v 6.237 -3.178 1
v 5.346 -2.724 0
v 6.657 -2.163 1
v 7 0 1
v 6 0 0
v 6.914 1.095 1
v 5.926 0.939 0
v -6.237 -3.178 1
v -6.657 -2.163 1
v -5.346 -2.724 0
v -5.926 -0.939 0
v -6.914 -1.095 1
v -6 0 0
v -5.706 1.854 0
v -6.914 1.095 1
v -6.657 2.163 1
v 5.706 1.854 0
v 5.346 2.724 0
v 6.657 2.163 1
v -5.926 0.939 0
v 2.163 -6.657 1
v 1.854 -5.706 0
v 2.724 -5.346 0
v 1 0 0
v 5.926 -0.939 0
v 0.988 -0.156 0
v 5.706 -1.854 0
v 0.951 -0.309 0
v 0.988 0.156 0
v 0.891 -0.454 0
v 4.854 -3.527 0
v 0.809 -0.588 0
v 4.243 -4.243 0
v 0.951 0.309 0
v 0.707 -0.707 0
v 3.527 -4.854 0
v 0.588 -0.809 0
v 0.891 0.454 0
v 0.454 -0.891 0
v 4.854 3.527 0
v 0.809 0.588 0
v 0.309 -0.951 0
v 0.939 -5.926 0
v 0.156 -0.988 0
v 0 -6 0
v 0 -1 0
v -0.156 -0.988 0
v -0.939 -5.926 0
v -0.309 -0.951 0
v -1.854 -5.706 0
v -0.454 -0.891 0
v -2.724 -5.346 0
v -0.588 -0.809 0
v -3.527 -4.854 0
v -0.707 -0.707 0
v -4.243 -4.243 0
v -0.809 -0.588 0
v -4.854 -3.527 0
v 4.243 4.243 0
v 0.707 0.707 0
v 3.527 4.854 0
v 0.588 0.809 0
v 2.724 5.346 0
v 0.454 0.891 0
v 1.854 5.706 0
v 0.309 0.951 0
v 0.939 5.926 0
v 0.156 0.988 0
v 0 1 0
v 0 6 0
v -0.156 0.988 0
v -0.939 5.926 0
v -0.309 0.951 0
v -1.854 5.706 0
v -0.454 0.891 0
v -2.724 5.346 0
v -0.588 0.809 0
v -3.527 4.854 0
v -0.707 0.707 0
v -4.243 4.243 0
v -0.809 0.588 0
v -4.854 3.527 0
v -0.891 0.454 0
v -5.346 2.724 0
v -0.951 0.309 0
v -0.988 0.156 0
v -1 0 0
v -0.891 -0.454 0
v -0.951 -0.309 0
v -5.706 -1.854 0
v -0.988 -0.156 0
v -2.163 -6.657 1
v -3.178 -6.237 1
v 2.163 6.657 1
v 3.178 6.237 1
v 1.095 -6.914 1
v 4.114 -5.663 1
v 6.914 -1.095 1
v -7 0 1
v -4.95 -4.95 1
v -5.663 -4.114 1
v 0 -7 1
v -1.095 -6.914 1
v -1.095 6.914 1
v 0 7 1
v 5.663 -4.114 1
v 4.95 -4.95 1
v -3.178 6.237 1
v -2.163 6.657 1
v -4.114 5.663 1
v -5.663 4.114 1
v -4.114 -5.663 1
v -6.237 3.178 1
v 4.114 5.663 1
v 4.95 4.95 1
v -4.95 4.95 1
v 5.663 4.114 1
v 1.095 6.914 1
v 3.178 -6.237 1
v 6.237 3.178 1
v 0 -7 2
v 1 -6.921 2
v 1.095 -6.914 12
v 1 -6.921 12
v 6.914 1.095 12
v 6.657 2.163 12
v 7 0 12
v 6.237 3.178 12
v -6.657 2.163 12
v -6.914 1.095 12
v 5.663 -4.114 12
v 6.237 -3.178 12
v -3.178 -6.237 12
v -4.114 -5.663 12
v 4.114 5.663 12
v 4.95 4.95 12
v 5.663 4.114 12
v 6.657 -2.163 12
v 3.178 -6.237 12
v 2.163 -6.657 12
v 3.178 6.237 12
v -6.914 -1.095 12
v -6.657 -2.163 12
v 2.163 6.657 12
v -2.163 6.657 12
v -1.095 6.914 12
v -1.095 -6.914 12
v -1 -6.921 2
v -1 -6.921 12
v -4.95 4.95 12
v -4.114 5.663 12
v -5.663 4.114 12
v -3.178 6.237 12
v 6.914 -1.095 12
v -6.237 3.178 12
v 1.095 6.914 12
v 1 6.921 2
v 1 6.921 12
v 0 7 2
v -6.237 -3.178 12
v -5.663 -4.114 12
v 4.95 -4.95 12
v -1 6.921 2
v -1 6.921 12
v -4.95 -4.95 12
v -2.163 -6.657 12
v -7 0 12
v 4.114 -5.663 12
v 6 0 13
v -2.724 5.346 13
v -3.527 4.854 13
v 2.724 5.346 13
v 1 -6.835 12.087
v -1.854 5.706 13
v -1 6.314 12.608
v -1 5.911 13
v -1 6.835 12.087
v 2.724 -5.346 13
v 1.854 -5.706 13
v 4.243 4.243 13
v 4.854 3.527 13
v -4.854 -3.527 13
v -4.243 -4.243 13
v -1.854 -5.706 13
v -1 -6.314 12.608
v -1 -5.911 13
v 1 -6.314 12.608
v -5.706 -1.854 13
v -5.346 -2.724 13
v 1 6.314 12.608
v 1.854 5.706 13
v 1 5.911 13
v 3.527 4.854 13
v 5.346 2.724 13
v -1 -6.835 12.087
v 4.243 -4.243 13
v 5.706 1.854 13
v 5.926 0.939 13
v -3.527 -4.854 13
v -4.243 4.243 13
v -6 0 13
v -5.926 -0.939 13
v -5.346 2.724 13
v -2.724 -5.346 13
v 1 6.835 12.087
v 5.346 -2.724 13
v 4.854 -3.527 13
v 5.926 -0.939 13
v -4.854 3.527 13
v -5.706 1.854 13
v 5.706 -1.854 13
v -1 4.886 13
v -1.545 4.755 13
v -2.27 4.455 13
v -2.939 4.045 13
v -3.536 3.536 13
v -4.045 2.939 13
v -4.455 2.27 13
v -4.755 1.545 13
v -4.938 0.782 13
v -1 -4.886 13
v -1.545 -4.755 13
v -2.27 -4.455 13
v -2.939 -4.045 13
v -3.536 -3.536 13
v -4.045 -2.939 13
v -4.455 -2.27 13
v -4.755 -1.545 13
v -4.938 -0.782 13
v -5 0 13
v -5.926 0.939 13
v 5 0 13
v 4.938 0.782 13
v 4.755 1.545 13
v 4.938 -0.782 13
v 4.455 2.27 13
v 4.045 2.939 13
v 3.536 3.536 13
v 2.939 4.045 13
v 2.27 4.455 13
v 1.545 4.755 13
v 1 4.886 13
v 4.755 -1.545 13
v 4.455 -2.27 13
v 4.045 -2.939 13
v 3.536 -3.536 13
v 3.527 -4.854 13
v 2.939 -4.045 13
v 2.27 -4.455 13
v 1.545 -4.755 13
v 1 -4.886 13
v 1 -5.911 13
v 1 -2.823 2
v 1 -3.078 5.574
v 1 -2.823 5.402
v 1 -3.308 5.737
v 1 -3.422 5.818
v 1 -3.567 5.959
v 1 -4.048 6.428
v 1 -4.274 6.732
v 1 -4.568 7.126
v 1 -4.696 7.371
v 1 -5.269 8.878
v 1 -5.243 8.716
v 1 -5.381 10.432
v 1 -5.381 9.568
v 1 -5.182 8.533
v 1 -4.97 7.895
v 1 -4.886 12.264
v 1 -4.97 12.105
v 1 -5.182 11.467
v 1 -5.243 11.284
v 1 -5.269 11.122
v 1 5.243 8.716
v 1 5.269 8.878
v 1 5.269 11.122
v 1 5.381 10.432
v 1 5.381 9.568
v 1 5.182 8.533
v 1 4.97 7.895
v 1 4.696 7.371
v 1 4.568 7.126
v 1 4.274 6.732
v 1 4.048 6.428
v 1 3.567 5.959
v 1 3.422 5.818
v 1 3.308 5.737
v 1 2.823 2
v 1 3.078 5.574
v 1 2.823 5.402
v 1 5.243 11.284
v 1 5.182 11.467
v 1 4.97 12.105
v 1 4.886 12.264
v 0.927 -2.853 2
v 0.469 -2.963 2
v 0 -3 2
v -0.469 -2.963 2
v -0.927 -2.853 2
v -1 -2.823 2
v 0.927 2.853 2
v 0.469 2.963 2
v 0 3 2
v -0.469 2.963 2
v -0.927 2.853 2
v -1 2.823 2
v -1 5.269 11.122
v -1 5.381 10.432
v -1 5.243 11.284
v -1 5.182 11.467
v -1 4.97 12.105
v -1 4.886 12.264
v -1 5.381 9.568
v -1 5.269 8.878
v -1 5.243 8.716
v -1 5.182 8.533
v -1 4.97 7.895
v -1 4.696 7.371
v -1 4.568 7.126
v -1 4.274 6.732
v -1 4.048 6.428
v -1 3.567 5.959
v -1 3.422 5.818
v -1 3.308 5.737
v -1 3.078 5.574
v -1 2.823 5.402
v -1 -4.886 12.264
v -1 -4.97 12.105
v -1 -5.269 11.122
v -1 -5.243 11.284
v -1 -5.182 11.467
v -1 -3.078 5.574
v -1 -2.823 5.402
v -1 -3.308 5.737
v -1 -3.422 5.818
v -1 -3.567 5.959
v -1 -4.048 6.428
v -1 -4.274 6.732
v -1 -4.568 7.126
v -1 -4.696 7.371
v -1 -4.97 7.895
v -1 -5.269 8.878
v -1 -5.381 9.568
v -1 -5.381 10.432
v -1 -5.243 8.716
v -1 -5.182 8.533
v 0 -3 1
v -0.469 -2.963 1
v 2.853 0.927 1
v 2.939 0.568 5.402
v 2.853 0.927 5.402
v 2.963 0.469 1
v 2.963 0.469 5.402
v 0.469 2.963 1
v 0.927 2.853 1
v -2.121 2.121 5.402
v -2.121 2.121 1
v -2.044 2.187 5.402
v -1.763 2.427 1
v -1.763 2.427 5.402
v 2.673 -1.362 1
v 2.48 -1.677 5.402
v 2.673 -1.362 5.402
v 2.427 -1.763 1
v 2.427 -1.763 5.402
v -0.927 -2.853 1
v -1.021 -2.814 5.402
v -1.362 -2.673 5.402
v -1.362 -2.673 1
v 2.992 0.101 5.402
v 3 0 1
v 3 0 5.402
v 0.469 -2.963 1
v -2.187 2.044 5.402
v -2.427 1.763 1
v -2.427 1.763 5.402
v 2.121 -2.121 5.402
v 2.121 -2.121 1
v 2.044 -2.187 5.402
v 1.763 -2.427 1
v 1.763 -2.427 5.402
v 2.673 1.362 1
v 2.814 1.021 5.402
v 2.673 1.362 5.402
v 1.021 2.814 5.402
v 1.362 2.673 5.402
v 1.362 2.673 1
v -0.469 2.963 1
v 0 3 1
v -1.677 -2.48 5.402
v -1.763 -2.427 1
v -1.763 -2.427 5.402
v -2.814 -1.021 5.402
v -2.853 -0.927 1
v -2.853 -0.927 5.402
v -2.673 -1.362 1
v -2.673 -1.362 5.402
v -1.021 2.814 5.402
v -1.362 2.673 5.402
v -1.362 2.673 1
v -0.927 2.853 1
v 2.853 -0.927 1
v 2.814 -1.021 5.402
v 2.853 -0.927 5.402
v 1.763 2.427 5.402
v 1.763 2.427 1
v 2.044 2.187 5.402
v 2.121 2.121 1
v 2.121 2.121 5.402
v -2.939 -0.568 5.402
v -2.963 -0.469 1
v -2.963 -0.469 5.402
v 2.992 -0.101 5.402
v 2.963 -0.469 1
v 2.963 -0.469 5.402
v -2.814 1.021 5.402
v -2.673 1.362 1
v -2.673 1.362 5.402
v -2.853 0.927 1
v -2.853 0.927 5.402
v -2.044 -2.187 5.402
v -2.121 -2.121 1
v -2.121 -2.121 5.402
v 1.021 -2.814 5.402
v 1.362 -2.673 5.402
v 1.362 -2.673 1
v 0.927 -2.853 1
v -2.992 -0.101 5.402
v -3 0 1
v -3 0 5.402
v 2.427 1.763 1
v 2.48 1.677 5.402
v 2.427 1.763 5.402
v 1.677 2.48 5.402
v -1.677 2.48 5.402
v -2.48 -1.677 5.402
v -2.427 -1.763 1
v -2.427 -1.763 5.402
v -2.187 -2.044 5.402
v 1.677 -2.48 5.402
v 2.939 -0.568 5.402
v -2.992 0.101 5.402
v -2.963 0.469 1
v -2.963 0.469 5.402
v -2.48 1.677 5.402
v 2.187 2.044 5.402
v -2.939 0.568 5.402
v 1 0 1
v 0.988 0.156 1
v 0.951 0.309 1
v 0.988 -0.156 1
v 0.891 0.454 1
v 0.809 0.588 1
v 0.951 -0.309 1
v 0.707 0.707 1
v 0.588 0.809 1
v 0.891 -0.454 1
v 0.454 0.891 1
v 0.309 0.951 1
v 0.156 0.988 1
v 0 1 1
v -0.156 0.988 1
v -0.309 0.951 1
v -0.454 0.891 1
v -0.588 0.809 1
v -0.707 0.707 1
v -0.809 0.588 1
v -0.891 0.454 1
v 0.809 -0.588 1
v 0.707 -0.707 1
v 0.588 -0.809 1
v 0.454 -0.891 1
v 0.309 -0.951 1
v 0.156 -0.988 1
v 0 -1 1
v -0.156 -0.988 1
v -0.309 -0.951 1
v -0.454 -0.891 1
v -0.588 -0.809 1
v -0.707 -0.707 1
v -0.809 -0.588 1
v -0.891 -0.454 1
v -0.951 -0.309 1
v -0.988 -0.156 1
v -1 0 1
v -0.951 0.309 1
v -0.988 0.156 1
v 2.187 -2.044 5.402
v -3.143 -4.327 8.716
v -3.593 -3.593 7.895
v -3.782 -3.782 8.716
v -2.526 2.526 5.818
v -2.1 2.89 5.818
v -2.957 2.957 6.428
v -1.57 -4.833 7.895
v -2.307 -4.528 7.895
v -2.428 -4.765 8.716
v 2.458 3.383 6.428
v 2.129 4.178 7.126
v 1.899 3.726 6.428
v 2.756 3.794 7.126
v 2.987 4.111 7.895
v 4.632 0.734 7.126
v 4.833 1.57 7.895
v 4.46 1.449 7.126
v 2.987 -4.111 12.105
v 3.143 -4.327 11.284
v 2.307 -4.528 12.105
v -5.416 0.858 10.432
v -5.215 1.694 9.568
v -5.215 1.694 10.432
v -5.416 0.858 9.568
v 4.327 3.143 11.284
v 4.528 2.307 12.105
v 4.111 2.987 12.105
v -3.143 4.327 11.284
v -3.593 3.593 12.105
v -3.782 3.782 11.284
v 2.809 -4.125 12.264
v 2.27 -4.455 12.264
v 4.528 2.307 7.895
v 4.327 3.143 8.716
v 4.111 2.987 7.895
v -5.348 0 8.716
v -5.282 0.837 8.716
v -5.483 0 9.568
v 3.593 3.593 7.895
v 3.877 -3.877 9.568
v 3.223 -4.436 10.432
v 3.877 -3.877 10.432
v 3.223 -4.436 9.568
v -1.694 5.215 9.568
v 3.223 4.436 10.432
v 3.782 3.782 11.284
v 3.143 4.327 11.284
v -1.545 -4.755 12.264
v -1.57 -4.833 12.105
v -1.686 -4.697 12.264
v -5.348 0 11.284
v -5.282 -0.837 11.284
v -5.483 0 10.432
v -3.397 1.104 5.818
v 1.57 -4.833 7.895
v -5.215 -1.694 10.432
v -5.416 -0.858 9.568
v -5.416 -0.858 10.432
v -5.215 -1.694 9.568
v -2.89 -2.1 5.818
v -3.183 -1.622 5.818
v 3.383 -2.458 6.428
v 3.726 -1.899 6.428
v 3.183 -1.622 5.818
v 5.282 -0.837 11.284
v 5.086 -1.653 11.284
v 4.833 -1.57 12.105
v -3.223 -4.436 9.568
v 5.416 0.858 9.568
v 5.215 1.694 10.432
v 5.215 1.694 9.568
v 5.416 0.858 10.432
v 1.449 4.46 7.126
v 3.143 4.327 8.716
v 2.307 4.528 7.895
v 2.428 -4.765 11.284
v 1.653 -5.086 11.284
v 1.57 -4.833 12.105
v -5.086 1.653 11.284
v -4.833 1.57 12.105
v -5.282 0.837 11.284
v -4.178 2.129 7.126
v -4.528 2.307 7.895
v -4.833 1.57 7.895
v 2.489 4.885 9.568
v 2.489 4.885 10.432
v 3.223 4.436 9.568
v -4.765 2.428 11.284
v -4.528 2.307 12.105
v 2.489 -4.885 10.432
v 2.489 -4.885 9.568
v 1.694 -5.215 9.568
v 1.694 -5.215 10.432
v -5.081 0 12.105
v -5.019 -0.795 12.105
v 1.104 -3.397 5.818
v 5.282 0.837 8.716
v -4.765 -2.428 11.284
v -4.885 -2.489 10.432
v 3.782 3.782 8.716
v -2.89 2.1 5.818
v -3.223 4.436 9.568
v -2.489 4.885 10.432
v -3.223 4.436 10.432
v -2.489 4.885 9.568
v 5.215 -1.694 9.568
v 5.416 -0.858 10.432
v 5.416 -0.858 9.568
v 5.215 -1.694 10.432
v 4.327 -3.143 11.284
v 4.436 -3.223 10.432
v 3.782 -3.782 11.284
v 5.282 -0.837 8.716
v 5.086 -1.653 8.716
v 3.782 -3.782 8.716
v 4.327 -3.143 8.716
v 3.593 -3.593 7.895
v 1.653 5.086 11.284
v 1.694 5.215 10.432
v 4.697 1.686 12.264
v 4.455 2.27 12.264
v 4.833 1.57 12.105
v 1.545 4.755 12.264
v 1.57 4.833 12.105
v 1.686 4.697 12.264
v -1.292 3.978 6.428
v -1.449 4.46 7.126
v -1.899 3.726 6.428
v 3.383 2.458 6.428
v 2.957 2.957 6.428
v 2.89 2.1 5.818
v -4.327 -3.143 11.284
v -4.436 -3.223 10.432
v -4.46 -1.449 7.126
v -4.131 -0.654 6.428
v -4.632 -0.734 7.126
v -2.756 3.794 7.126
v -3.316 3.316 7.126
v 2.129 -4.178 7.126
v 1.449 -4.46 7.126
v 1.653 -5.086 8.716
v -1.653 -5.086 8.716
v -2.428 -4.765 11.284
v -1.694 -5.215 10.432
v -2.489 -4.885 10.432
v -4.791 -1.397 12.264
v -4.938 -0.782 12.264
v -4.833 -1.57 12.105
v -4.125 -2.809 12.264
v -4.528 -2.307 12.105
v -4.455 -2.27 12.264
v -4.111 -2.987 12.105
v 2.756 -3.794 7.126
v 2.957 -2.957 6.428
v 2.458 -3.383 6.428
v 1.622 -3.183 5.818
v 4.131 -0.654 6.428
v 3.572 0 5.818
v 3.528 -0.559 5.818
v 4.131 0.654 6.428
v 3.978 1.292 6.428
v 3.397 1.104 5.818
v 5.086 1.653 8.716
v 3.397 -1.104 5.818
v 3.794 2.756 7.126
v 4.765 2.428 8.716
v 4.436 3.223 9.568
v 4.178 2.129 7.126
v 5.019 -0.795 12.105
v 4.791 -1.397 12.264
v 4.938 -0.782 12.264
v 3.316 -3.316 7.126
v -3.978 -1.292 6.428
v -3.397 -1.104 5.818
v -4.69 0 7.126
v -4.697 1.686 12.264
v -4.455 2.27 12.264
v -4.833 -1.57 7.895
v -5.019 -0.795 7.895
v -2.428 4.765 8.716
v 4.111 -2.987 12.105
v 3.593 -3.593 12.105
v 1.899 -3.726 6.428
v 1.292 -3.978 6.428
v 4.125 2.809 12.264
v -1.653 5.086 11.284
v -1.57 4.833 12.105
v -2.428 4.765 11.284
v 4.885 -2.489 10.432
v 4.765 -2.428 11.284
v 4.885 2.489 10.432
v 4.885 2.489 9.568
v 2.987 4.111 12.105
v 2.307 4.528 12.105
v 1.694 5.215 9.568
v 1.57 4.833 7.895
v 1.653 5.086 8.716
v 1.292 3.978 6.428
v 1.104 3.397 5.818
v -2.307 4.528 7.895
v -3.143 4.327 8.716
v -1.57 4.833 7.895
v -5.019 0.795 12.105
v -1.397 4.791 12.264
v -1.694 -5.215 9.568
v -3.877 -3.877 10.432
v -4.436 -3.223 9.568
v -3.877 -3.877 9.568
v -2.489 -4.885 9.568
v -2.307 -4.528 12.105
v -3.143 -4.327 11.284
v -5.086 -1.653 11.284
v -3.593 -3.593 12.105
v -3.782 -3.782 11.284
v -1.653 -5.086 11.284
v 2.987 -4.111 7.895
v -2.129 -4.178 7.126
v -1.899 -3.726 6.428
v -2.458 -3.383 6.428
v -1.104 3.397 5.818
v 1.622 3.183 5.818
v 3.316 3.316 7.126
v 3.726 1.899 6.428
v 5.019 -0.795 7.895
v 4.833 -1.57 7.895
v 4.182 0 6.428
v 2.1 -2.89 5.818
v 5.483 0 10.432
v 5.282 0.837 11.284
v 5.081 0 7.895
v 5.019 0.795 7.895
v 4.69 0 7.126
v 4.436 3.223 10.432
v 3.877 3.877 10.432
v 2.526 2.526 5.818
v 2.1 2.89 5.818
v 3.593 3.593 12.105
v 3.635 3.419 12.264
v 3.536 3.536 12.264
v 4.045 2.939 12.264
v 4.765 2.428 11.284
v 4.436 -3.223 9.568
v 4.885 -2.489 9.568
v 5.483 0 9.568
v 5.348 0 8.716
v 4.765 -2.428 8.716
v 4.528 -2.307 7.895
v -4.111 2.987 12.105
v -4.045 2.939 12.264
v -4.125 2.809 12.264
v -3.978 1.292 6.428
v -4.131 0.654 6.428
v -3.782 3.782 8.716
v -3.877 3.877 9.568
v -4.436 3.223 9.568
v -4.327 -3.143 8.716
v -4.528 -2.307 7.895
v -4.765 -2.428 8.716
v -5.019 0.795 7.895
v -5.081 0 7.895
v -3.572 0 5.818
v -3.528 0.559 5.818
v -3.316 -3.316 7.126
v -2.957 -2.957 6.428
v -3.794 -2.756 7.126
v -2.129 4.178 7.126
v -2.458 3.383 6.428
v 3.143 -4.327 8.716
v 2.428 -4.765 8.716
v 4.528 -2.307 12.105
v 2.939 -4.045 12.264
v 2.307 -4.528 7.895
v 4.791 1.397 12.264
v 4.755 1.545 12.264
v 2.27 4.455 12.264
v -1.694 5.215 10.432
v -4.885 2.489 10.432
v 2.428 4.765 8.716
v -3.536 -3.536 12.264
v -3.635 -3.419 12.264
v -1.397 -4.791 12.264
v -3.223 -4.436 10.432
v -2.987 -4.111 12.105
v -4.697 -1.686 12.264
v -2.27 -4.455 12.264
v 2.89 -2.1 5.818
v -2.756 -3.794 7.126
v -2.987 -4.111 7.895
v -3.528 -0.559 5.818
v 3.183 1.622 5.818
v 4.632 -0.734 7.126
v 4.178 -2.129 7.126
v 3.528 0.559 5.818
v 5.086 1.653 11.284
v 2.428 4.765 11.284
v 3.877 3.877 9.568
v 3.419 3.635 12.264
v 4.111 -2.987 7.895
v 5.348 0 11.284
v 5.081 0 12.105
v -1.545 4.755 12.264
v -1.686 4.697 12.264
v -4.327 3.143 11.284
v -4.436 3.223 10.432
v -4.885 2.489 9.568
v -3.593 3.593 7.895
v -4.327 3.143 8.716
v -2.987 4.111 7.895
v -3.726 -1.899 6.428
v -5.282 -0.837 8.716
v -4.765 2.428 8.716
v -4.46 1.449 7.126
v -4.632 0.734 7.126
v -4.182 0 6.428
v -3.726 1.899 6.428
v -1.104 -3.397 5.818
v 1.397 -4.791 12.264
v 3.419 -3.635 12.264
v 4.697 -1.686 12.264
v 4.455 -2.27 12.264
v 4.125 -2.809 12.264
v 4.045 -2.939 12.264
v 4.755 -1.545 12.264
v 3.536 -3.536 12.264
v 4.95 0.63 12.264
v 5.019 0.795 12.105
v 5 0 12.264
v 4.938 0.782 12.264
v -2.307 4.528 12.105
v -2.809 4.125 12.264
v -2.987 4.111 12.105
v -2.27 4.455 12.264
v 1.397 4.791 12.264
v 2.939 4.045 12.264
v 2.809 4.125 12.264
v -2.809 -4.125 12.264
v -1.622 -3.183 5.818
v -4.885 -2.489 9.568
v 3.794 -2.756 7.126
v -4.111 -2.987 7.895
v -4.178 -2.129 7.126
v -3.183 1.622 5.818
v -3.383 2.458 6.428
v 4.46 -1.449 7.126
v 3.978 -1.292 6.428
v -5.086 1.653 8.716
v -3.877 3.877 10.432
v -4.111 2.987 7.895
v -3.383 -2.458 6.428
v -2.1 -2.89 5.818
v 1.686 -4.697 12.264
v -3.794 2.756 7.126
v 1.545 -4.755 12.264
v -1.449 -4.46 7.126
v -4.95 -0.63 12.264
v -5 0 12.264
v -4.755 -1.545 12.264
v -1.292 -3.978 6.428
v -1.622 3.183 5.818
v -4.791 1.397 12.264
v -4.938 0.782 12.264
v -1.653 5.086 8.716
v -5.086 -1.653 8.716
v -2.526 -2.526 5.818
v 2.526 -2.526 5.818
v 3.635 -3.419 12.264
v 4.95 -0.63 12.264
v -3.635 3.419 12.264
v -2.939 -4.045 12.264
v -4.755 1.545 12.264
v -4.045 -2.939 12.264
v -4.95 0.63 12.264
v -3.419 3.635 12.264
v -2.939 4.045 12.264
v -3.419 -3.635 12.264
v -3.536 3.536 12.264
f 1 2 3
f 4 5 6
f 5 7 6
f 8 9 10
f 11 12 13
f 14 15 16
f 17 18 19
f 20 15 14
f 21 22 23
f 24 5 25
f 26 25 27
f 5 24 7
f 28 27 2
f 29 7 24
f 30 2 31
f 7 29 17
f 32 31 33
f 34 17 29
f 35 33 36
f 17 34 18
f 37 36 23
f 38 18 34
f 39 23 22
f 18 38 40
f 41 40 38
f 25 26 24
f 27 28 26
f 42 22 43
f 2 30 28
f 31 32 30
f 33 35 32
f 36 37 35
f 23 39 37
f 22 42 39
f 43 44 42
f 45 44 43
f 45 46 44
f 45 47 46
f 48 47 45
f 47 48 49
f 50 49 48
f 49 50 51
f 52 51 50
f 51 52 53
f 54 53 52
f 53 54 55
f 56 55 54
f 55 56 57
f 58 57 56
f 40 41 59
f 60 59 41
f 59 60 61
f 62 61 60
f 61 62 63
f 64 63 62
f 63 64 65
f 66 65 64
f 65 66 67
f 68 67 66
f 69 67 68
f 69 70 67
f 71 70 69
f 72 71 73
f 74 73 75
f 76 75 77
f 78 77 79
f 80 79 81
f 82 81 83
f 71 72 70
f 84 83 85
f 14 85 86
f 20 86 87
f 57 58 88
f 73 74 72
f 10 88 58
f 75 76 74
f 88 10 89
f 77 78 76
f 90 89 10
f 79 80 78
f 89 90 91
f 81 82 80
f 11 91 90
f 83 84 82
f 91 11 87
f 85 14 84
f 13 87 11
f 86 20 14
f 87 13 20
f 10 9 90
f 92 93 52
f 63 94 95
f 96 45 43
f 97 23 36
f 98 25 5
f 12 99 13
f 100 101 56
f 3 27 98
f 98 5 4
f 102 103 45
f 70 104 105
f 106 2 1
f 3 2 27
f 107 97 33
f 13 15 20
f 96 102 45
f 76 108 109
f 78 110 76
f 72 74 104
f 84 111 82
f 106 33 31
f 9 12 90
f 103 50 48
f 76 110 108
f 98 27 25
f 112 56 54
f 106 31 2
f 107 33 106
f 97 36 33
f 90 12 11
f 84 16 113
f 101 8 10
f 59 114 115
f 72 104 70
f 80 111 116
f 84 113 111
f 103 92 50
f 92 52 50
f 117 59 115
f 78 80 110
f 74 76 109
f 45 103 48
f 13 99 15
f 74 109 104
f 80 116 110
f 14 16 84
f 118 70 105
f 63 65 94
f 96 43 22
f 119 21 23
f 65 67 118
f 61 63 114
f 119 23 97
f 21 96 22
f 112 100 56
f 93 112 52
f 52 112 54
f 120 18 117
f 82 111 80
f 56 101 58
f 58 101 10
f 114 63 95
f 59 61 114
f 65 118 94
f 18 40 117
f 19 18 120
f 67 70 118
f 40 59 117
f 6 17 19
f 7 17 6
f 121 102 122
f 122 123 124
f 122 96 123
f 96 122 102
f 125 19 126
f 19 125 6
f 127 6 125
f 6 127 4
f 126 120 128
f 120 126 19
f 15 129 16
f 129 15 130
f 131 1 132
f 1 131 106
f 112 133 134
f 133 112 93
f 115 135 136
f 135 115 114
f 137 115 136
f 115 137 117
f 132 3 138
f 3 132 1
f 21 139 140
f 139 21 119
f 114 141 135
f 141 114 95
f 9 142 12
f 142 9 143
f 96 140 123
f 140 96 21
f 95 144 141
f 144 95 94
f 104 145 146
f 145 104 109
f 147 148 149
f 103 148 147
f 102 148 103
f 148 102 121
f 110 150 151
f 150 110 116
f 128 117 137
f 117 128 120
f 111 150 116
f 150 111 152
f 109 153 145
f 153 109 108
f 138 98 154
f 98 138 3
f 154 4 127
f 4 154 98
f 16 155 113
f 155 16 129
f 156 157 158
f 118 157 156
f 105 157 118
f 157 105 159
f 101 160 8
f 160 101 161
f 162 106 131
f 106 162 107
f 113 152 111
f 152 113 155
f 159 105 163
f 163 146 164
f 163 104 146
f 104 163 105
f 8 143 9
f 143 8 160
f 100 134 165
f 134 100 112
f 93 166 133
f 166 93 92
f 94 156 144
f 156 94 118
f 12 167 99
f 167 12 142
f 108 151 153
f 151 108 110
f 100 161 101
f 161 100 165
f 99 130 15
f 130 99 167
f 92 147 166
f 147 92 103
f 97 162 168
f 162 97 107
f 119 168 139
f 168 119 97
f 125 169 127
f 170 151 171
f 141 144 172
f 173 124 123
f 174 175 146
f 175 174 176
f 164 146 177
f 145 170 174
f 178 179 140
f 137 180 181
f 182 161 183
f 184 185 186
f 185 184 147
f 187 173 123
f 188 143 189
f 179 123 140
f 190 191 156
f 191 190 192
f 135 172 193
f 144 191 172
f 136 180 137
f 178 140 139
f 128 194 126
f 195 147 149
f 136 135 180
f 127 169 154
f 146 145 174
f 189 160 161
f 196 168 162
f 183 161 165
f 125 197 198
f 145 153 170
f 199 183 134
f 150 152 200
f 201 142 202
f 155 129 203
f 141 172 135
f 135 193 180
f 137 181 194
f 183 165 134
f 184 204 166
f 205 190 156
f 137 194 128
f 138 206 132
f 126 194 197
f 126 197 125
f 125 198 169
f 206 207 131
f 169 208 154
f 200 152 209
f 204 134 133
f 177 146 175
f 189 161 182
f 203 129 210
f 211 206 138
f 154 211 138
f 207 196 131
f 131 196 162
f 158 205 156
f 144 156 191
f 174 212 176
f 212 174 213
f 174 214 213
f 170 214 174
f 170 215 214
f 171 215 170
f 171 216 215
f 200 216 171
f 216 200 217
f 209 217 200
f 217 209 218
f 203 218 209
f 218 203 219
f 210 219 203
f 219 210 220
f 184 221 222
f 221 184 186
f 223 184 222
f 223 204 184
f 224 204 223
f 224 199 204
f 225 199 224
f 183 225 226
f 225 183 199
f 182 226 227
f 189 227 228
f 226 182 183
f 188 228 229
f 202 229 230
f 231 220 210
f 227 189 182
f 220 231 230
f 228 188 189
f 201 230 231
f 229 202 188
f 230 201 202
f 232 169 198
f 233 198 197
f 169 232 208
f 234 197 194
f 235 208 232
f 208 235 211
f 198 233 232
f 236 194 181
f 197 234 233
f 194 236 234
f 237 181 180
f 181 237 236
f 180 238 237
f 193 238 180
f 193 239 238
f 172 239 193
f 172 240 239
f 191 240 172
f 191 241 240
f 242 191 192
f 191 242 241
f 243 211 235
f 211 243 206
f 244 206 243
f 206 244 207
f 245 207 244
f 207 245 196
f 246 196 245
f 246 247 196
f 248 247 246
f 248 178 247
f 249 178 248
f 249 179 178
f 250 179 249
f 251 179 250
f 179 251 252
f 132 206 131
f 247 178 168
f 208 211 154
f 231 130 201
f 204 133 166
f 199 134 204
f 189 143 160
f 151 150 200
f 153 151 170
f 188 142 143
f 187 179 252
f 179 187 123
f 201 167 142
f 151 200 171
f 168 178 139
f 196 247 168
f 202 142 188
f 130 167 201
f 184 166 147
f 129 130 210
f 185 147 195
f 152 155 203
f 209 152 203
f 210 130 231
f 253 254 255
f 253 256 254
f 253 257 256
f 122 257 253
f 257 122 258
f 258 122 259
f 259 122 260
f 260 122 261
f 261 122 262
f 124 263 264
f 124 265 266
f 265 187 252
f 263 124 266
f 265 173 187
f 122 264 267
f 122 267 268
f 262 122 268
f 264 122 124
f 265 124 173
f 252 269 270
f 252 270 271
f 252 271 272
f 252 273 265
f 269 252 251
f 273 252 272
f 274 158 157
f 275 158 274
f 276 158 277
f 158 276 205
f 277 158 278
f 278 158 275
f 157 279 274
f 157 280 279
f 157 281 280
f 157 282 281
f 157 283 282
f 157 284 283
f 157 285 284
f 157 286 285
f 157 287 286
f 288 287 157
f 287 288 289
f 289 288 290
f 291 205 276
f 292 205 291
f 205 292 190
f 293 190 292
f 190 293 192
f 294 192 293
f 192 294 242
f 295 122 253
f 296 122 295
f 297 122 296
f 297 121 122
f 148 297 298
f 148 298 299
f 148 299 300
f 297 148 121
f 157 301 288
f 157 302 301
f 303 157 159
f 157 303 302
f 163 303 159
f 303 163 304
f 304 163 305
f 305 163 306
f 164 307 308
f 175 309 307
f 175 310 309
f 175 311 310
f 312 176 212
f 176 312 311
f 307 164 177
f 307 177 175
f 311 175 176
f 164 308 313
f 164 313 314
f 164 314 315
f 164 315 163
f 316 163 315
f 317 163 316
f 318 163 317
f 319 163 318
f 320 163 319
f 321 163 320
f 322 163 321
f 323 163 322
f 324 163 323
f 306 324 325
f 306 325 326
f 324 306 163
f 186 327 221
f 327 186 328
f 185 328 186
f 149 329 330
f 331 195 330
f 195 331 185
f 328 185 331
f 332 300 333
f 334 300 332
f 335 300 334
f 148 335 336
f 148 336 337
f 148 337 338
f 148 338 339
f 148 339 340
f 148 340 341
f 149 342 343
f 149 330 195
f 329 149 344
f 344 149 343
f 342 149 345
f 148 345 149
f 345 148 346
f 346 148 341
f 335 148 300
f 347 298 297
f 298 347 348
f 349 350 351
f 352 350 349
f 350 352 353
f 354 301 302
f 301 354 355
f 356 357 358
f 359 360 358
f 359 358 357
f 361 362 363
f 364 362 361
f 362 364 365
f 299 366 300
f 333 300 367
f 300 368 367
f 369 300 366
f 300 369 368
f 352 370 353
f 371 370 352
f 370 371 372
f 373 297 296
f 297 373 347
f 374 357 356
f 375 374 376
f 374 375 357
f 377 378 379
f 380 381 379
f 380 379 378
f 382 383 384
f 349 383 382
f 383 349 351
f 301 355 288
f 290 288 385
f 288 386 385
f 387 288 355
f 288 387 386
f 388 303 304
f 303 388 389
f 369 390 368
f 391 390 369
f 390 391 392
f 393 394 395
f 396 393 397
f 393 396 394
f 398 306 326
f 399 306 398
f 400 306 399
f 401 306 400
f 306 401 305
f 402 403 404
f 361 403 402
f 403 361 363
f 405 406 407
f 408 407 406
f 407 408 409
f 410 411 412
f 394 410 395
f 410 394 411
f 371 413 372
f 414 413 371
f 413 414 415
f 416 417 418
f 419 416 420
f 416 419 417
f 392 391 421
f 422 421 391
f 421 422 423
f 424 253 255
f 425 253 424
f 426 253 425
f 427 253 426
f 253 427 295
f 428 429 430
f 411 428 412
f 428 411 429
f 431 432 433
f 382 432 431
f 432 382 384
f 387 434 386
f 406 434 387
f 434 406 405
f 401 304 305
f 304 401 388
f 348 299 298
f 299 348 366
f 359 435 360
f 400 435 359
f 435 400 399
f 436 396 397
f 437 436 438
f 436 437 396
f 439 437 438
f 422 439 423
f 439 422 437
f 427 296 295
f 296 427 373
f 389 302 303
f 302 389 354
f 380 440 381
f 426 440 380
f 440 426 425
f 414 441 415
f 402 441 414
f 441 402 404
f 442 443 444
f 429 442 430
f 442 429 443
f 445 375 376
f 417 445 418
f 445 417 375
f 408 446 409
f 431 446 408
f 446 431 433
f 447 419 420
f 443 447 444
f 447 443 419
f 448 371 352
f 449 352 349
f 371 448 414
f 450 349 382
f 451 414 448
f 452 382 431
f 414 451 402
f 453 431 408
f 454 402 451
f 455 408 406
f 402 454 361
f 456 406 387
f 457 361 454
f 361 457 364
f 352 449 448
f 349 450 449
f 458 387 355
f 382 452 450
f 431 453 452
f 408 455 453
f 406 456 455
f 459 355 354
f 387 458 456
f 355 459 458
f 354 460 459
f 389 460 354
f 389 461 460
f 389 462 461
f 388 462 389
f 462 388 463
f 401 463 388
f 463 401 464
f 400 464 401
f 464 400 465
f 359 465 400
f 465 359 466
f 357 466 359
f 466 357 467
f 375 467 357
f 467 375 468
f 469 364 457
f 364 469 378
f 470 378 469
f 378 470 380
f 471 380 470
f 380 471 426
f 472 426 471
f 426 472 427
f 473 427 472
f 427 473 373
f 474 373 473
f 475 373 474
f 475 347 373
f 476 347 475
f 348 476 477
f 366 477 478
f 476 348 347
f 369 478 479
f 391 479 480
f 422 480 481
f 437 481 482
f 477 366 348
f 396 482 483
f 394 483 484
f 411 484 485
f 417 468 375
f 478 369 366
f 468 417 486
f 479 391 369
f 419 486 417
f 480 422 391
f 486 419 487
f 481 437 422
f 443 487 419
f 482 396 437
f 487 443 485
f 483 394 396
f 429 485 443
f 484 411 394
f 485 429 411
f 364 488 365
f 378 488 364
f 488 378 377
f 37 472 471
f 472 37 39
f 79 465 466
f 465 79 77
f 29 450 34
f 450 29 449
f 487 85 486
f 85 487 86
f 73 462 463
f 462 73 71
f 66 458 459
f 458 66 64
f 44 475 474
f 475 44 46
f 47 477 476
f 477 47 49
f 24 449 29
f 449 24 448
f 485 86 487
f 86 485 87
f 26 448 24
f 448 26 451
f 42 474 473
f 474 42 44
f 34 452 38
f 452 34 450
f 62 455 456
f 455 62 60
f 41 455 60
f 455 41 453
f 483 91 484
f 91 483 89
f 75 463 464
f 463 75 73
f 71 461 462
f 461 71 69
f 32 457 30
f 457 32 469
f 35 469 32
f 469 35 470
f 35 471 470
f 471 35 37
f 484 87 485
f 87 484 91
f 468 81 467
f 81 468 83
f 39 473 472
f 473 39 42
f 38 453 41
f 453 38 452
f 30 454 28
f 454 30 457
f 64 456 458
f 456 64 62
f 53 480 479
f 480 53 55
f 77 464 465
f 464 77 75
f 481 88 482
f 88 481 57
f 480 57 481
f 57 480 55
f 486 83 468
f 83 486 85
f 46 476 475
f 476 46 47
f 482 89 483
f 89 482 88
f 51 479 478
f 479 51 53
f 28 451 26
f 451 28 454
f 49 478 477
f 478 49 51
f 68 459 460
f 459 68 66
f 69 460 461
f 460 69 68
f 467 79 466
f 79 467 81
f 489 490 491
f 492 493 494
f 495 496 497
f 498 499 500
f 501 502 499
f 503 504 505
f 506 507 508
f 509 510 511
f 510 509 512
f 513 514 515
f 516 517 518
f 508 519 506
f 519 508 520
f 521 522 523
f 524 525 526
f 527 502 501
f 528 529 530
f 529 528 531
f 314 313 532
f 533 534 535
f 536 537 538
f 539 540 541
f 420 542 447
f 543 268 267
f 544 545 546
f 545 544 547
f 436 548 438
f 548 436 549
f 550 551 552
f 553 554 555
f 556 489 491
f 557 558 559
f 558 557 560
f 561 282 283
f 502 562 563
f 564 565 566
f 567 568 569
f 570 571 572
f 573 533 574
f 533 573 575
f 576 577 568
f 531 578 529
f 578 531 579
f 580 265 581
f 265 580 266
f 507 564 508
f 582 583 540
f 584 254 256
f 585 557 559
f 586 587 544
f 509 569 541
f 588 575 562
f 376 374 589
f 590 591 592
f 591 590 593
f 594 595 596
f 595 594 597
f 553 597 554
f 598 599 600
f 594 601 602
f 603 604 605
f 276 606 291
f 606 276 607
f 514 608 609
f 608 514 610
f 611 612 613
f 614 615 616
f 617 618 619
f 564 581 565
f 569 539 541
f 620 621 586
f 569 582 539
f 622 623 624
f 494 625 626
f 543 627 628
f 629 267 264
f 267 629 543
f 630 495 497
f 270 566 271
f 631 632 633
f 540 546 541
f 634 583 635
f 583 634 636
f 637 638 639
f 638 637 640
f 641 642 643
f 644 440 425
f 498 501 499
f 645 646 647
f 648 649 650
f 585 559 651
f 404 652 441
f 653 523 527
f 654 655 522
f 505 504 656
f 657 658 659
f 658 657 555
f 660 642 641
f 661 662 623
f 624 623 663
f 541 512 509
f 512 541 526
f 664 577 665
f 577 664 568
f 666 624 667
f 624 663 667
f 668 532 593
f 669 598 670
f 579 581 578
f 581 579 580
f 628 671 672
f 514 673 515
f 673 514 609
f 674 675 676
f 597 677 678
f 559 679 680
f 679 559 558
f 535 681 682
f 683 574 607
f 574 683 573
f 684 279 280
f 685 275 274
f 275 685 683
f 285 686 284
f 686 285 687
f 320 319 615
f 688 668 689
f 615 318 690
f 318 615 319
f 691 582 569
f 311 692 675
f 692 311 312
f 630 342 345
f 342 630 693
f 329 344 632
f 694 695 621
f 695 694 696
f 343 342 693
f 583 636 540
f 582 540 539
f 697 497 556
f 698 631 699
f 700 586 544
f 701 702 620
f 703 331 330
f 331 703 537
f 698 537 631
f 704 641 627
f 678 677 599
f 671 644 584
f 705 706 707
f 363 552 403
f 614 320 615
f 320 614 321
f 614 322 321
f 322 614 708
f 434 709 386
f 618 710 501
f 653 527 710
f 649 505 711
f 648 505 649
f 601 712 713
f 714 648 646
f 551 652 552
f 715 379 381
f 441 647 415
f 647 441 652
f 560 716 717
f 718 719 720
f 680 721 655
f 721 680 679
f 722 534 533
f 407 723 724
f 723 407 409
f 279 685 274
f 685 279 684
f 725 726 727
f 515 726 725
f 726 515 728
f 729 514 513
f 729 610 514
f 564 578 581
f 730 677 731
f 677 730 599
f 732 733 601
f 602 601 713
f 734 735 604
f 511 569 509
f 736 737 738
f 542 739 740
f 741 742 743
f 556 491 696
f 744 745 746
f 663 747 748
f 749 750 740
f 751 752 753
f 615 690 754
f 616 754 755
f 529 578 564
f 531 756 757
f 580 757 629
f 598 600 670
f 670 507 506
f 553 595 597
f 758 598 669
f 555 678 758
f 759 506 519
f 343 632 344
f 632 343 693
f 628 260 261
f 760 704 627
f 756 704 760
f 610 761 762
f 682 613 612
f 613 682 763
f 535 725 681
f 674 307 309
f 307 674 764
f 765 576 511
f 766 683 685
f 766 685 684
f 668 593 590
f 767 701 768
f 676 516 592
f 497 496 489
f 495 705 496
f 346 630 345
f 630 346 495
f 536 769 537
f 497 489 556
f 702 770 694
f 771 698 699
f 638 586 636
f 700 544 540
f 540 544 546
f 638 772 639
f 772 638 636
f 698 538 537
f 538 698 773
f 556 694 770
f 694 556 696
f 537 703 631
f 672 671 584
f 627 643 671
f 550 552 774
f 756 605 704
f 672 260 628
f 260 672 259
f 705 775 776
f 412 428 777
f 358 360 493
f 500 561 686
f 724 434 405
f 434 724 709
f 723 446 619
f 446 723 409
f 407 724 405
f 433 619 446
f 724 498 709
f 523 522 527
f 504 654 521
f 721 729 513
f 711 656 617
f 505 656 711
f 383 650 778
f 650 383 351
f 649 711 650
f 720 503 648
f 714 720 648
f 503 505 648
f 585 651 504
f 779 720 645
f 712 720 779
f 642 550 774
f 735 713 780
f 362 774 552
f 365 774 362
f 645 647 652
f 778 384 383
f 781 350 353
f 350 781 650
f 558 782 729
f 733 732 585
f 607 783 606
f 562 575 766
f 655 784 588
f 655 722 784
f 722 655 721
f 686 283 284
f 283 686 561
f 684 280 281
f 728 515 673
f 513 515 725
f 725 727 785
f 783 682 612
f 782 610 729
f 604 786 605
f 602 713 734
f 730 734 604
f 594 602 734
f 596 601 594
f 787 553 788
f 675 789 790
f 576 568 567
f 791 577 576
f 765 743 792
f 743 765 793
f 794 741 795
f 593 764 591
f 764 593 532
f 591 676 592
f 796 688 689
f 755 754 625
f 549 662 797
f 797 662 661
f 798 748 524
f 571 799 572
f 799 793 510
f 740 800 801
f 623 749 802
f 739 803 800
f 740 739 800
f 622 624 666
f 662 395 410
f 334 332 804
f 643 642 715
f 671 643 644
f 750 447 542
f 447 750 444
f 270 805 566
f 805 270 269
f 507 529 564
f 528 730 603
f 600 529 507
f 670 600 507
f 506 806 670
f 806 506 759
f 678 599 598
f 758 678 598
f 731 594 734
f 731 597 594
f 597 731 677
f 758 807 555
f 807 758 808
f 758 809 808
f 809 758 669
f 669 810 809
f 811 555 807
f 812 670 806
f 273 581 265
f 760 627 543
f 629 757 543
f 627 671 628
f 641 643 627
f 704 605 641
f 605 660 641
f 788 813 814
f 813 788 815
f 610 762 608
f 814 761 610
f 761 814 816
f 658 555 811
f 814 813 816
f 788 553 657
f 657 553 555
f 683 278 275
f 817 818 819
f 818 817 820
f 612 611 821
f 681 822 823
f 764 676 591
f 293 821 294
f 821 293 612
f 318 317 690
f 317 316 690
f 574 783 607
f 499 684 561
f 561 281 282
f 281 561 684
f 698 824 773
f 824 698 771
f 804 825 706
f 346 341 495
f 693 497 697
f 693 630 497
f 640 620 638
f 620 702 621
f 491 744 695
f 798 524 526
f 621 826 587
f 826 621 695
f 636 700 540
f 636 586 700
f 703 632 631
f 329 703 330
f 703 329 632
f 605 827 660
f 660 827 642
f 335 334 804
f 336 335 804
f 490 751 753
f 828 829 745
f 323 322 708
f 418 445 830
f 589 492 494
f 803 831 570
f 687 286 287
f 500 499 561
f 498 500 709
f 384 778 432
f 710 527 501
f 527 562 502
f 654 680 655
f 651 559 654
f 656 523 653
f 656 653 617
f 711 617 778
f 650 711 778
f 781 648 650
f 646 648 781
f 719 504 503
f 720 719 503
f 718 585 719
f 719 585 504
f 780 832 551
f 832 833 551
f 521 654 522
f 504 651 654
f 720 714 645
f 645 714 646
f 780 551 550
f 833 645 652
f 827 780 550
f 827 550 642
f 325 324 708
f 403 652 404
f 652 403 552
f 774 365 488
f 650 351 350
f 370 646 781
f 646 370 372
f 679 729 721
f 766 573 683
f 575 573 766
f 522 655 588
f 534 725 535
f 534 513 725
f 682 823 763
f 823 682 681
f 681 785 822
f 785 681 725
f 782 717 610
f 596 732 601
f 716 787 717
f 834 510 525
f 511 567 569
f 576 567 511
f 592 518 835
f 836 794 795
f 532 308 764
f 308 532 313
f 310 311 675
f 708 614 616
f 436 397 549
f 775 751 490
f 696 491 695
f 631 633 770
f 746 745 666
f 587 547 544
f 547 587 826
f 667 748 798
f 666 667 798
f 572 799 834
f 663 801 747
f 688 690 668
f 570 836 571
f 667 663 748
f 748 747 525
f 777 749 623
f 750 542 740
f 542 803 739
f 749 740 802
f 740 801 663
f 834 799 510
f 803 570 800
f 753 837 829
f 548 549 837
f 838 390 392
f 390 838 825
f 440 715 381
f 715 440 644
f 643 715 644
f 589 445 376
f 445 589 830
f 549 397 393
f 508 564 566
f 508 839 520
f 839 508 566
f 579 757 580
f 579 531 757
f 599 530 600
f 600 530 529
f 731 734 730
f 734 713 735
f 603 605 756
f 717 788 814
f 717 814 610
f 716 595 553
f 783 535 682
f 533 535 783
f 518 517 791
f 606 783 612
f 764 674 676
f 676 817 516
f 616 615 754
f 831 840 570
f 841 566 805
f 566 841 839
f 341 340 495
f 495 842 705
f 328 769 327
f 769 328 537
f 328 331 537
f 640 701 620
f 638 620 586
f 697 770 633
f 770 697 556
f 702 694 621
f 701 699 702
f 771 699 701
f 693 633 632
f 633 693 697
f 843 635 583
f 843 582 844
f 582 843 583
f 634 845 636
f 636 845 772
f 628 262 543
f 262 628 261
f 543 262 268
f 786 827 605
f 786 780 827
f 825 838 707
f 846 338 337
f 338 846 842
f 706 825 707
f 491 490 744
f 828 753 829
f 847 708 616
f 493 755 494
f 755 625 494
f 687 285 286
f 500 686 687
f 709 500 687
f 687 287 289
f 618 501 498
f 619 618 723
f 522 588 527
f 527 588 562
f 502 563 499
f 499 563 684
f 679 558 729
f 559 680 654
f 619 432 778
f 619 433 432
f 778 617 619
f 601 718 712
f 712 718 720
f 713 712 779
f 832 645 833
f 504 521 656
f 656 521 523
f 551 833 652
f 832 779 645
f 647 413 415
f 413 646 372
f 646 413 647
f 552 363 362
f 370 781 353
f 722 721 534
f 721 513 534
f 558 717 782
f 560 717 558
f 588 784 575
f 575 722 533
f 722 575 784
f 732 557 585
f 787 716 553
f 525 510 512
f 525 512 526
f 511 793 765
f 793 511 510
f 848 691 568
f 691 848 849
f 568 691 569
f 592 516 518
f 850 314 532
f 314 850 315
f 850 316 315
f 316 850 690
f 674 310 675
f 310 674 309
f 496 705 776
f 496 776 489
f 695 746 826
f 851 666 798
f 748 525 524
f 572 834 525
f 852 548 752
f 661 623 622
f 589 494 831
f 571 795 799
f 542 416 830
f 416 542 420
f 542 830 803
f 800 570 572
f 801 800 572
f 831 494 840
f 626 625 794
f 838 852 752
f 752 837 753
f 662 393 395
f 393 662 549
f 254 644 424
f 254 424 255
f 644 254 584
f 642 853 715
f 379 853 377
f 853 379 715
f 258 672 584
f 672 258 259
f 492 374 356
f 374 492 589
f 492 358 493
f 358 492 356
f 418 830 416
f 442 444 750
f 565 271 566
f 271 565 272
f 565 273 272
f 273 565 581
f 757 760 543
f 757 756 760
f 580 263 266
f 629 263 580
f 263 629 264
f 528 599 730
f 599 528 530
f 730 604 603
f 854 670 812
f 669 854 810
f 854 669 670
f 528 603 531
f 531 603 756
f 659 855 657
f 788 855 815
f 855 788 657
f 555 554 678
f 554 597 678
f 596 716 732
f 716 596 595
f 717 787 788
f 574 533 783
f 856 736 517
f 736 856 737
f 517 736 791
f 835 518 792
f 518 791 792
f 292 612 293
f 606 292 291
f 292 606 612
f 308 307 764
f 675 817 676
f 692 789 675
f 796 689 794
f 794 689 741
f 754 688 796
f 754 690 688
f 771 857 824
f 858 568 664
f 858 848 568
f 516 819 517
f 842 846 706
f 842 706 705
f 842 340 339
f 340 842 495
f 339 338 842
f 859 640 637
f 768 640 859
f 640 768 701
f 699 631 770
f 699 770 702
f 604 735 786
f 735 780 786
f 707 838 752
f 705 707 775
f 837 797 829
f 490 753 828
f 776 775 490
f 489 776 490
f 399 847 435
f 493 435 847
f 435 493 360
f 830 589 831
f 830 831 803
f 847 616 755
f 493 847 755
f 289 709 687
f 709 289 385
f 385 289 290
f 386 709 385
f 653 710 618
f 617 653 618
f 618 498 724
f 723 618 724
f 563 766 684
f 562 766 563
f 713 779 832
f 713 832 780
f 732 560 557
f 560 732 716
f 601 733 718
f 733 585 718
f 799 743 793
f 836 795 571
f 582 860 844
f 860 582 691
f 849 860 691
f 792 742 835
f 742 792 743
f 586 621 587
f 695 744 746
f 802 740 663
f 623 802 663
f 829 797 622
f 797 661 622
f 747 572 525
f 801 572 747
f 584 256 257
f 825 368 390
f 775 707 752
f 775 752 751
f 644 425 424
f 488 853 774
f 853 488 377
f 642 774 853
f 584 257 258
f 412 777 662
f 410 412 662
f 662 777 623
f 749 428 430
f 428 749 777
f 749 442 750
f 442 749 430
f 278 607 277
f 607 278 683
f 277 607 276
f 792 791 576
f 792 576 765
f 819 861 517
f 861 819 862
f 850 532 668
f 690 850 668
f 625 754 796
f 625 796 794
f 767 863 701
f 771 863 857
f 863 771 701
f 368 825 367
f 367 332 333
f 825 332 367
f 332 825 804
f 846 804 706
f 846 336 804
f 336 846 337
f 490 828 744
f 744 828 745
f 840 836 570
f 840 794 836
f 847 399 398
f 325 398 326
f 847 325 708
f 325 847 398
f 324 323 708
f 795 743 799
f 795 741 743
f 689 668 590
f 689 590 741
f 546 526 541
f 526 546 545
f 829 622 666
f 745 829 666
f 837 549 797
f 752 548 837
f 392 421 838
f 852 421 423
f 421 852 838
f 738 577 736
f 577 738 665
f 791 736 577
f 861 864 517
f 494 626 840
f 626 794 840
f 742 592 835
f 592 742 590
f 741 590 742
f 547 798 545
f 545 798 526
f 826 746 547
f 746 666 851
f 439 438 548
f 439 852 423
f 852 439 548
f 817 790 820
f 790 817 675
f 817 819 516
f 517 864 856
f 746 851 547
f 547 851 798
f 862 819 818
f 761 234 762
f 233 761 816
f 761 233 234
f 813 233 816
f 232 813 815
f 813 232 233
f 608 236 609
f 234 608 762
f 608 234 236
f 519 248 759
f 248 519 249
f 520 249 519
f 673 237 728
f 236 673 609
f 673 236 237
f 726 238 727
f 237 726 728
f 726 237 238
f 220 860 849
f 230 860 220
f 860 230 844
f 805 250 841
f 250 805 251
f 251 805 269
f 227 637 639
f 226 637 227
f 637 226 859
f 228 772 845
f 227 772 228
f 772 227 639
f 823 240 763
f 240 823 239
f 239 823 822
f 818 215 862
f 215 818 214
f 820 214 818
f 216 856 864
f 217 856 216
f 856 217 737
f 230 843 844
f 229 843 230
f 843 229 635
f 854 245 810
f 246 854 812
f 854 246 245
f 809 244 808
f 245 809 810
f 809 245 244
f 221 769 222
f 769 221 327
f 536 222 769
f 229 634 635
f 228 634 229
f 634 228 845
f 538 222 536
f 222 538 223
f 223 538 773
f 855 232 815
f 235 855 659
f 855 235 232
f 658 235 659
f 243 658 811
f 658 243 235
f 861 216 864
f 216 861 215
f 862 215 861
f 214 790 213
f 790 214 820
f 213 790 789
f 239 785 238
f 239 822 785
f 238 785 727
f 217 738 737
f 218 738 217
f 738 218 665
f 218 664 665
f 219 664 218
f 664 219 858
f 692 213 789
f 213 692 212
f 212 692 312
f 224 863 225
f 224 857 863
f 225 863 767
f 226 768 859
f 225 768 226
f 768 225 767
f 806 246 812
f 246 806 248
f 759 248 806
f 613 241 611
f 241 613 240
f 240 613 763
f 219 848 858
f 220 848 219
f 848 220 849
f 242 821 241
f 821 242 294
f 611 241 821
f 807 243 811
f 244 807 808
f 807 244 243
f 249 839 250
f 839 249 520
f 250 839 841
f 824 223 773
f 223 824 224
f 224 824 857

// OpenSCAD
// Soporte de bola loca para Sapoconcho (no paramétrico)

$fn=40;

difference(){

union(){    
    cylinder(r1=6,r2=7,h=1);
    translate([0,0,1])cylinder(r=7,h=11);
    translate([0,0,12])cylinder(r1=7,r2=6,h=1);
}

translate([0,0,8])cube([2,16,12],center=true);
translate([0,0,1])cylinder(r=3,h=5);
translate([0,0,-1])cylinder(r=1,h=5);
translate([0,0,10])sphere(5.5);
translate([0,0,8])cylinder(r=5,h=6);

}
